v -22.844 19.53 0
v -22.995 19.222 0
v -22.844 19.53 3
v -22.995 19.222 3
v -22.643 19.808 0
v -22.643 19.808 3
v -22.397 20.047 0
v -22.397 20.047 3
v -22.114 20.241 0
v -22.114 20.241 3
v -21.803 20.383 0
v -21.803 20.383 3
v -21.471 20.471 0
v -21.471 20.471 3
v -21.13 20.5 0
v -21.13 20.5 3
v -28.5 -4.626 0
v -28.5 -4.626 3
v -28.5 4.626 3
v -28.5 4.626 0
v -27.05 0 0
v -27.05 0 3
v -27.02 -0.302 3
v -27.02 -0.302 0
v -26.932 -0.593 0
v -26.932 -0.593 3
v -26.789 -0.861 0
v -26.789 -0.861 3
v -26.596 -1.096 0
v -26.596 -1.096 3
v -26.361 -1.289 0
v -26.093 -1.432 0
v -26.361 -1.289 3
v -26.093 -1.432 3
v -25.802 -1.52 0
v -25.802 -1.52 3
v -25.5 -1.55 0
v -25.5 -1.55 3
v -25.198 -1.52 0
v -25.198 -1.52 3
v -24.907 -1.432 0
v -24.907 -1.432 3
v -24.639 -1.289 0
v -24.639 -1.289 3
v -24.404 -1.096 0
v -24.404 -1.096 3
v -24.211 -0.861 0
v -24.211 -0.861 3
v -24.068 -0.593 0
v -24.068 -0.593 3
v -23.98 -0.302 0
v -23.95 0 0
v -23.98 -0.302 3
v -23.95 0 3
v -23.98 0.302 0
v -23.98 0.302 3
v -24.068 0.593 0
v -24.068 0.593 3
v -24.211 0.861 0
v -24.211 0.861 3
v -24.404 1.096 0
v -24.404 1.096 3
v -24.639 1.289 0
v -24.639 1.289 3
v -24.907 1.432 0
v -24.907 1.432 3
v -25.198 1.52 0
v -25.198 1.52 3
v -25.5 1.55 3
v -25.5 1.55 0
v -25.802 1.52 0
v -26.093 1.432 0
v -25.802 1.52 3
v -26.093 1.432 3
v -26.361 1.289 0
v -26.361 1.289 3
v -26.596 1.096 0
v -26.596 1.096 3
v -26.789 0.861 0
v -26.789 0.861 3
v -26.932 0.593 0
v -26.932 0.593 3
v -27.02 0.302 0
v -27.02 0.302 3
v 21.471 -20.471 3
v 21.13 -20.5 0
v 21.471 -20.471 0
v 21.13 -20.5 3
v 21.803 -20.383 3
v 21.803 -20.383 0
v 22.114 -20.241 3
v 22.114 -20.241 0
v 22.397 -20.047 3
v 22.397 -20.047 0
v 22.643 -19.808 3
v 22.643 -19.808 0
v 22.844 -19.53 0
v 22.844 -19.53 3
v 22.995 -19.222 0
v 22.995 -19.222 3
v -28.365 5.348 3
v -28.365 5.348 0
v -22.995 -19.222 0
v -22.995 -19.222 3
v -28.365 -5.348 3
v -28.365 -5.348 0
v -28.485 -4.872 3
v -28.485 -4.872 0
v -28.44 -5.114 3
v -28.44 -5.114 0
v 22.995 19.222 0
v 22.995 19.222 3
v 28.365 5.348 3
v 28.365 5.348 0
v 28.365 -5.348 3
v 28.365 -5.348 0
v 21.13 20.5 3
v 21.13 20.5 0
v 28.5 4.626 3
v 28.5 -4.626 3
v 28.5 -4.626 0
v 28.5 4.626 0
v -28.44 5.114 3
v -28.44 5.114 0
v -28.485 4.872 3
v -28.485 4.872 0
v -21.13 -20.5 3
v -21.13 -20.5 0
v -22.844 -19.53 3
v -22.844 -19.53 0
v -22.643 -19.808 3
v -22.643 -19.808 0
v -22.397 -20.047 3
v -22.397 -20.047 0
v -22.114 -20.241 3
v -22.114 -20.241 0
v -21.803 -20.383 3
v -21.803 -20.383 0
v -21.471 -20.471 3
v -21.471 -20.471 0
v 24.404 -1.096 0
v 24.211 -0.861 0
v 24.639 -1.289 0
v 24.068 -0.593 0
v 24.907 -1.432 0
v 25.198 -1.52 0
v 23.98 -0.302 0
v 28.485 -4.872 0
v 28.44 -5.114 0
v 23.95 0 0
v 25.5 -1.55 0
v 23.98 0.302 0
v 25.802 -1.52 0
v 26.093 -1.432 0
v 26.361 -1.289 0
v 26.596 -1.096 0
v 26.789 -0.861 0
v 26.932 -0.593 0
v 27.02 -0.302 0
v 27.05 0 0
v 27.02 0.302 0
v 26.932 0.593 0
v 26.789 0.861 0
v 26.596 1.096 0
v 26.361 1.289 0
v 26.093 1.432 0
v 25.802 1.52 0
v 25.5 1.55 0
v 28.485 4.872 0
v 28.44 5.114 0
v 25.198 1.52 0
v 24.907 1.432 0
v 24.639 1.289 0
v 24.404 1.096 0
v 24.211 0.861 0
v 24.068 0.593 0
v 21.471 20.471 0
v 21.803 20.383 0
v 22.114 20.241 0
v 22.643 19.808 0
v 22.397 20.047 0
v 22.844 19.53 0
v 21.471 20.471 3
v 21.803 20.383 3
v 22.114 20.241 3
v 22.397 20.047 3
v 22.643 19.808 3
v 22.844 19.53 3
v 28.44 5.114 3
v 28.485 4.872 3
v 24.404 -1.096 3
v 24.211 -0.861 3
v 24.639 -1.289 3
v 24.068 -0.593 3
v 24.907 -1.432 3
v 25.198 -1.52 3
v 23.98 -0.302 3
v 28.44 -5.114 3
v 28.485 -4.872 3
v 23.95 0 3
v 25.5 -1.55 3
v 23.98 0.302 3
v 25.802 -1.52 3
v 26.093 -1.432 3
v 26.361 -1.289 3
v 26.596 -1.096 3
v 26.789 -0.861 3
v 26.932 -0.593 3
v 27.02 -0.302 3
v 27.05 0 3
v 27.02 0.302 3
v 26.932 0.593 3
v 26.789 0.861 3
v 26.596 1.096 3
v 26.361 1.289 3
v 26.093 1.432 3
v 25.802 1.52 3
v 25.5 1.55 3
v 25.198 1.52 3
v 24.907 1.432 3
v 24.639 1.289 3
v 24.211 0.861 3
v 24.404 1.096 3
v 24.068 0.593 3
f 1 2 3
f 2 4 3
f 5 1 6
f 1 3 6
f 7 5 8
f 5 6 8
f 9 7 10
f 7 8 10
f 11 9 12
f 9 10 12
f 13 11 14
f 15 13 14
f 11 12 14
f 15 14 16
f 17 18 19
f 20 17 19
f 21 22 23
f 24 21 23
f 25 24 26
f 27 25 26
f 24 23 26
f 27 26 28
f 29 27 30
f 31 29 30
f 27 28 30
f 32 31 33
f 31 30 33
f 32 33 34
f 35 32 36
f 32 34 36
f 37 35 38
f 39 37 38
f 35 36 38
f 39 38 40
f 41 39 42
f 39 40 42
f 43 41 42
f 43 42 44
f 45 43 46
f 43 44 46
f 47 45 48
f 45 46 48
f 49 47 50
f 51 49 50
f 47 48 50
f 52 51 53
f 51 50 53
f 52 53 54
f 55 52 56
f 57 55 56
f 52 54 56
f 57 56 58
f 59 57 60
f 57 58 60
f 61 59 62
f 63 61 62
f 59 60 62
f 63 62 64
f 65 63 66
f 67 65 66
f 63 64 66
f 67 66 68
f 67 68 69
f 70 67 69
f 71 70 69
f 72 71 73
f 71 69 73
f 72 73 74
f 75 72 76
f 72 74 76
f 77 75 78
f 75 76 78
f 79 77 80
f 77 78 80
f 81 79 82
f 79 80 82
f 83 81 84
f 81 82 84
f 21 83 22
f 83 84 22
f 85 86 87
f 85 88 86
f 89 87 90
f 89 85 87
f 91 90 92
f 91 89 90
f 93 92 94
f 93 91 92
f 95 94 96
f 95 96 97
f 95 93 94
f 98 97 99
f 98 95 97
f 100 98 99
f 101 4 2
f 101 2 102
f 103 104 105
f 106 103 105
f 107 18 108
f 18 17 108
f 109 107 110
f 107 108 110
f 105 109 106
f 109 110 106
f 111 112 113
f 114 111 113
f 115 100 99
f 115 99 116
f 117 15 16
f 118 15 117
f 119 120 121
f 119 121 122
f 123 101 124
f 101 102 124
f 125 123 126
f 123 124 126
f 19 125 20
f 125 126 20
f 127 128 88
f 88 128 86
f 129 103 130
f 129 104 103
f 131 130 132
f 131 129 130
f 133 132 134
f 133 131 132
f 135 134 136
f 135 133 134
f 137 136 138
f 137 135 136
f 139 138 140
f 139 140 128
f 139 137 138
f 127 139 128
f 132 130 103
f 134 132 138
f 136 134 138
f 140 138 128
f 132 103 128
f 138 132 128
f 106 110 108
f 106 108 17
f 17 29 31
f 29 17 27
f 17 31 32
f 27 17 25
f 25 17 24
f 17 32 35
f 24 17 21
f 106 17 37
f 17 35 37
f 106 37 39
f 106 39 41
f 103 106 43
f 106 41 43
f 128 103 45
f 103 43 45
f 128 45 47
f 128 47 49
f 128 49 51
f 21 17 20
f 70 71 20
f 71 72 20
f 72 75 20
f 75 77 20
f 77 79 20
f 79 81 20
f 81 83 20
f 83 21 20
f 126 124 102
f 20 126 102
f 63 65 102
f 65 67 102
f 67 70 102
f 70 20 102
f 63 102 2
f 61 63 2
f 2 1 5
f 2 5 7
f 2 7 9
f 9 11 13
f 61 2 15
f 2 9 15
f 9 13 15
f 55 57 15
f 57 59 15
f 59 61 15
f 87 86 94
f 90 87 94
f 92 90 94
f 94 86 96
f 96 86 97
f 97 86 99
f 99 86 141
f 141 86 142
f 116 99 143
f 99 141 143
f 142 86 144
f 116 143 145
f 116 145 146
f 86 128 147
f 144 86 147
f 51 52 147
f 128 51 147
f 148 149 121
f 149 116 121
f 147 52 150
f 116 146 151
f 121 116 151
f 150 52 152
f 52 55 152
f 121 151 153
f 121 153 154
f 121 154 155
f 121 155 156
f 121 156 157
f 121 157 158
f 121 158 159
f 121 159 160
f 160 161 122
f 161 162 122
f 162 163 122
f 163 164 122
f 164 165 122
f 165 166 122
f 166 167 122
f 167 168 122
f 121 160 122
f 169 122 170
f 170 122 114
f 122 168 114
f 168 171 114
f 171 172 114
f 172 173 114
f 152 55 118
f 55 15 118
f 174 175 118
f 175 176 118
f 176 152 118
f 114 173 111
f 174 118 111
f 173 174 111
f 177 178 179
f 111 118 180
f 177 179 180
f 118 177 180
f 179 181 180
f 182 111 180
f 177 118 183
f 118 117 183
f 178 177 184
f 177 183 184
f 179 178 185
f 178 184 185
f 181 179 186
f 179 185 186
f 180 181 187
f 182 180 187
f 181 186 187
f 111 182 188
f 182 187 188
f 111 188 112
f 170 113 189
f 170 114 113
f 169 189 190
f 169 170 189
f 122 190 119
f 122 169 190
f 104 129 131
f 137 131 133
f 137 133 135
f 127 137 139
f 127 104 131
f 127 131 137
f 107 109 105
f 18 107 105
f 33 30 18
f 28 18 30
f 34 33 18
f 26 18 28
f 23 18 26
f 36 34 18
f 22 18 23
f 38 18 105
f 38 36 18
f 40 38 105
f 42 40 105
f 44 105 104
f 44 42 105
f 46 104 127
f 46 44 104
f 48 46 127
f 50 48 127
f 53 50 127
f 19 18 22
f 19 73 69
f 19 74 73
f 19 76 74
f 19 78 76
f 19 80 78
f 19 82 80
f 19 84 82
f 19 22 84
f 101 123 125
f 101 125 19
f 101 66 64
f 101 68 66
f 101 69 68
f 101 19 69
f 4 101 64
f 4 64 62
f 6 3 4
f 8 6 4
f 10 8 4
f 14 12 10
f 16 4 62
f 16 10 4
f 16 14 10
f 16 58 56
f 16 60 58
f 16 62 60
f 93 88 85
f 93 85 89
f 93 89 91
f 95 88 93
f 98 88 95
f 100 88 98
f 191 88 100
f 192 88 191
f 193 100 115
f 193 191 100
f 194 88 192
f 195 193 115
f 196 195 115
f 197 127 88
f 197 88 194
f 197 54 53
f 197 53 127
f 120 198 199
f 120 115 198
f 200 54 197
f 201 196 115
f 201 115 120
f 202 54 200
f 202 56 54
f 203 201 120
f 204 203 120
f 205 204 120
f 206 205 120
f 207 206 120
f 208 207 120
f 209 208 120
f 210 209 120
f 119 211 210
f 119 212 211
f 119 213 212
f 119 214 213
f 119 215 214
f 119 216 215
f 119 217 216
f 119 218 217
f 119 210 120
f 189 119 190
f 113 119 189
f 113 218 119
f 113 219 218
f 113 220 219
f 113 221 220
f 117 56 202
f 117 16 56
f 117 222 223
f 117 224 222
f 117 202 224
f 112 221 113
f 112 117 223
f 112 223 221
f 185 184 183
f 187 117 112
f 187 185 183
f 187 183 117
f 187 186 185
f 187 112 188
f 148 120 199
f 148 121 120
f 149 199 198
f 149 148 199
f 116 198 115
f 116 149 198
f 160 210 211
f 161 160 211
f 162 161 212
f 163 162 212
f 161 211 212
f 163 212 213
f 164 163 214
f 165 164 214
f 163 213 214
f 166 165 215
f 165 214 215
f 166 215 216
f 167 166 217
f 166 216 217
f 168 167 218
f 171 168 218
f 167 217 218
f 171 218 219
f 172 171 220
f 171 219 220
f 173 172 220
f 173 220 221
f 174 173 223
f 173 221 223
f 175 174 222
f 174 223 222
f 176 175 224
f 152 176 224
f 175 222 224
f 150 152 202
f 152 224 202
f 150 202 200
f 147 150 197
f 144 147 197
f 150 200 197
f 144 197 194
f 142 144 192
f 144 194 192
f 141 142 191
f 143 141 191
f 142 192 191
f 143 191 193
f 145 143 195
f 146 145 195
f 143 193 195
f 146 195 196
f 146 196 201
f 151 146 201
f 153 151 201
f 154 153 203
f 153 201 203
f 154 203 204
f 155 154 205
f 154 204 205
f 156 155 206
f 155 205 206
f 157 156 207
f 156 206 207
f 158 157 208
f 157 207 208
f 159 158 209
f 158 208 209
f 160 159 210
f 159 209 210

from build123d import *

# Parameters (mm, degrees)
SKETCH_1_W          = 45
SKETCH_1_H          = 41
EXTRUDE_1_DEPTH     = 3
SKETCH_2_W          = 12
SKETCH_2_H          = 10
EXTRUDE_2_DEPTH     = 3
EXTRUDE_3_DEPTH     = 3
SKETCH_4_R          = 1.55
CUT_EXTRUDE_1_DEPTH = 3
FILLET_1_R          = 2


with BuildPart() as part:
    # 草图1 → 凸台-拉伸1 (new body)
    with BuildSketch(Plane.XY):
        Rectangle(SKETCH_1_W, SKETCH_1_H)
    extrude(amount=EXTRUDE_1_DEPTH)

    # 草图2 → 凸台-拉伸2 (add)
    with BuildSketch(Plane.XY.offset(3)):
        with Locations((22.5, 0)):
            Rectangle(SKETCH_2_W, SKETCH_2_H)
        with Locations((-22.5, 0)):
            Rectangle(SKETCH_2_W, SKETCH_2_H)
    extrude(amount=-EXTRUDE_2_DEPTH)

    # 草图3 → 凸台-拉伸3 (add)
    with BuildSketch(Plane.XY.offset(3)):
        Polygon((-22.5, 20.5), (-28.5, 5), (-22.5, 5), align=None)
        Polygon((22.5, 5), (22.5, 20.5), (28.5, 5), align=None)
        Polygon((-28.5, -5), (-22.5, -5), (-22.5, -20.5), align=None)
        Polygon((22.5, -20.5), (28.5, -5), (22.5, -5), align=None)
    extrude(amount=-EXTRUDE_3_DEPTH)

    # 草图4 → 切除-拉伸1 (cut)
    with BuildSketch(Plane.XY.offset(3)):
        with Locations((25.5, 0)):
            Circle(SKETCH_4_R)
        with Locations(Location((-25.5, 0, 0), (0, 0, 180))):
            Circle(SKETCH_4_R)
    extrude(amount=-CUT_EXTRUDE_1_DEPTH, mode=Mode.SUBTRACT)

    # 圆角1
    fillet_1_edges = [part.edges().sort_by_distance(p)[0] for p in [
        (28.5, -5, 1.5),
        (28.5, 5, 1.5),
        (-28.5, 5, 1.5),
        (-28.5, -5, 1.5),
        (22.5, -20.5, 1.5),
        (-22.5, -20.5, 1.5),
        (-22.5, 20.5, 1.5),
        (22.5, 20.5, 1.5),
    ]]
    fillet(fillet_1_edges, radius=FILLET_1_R)


solid = part.part
